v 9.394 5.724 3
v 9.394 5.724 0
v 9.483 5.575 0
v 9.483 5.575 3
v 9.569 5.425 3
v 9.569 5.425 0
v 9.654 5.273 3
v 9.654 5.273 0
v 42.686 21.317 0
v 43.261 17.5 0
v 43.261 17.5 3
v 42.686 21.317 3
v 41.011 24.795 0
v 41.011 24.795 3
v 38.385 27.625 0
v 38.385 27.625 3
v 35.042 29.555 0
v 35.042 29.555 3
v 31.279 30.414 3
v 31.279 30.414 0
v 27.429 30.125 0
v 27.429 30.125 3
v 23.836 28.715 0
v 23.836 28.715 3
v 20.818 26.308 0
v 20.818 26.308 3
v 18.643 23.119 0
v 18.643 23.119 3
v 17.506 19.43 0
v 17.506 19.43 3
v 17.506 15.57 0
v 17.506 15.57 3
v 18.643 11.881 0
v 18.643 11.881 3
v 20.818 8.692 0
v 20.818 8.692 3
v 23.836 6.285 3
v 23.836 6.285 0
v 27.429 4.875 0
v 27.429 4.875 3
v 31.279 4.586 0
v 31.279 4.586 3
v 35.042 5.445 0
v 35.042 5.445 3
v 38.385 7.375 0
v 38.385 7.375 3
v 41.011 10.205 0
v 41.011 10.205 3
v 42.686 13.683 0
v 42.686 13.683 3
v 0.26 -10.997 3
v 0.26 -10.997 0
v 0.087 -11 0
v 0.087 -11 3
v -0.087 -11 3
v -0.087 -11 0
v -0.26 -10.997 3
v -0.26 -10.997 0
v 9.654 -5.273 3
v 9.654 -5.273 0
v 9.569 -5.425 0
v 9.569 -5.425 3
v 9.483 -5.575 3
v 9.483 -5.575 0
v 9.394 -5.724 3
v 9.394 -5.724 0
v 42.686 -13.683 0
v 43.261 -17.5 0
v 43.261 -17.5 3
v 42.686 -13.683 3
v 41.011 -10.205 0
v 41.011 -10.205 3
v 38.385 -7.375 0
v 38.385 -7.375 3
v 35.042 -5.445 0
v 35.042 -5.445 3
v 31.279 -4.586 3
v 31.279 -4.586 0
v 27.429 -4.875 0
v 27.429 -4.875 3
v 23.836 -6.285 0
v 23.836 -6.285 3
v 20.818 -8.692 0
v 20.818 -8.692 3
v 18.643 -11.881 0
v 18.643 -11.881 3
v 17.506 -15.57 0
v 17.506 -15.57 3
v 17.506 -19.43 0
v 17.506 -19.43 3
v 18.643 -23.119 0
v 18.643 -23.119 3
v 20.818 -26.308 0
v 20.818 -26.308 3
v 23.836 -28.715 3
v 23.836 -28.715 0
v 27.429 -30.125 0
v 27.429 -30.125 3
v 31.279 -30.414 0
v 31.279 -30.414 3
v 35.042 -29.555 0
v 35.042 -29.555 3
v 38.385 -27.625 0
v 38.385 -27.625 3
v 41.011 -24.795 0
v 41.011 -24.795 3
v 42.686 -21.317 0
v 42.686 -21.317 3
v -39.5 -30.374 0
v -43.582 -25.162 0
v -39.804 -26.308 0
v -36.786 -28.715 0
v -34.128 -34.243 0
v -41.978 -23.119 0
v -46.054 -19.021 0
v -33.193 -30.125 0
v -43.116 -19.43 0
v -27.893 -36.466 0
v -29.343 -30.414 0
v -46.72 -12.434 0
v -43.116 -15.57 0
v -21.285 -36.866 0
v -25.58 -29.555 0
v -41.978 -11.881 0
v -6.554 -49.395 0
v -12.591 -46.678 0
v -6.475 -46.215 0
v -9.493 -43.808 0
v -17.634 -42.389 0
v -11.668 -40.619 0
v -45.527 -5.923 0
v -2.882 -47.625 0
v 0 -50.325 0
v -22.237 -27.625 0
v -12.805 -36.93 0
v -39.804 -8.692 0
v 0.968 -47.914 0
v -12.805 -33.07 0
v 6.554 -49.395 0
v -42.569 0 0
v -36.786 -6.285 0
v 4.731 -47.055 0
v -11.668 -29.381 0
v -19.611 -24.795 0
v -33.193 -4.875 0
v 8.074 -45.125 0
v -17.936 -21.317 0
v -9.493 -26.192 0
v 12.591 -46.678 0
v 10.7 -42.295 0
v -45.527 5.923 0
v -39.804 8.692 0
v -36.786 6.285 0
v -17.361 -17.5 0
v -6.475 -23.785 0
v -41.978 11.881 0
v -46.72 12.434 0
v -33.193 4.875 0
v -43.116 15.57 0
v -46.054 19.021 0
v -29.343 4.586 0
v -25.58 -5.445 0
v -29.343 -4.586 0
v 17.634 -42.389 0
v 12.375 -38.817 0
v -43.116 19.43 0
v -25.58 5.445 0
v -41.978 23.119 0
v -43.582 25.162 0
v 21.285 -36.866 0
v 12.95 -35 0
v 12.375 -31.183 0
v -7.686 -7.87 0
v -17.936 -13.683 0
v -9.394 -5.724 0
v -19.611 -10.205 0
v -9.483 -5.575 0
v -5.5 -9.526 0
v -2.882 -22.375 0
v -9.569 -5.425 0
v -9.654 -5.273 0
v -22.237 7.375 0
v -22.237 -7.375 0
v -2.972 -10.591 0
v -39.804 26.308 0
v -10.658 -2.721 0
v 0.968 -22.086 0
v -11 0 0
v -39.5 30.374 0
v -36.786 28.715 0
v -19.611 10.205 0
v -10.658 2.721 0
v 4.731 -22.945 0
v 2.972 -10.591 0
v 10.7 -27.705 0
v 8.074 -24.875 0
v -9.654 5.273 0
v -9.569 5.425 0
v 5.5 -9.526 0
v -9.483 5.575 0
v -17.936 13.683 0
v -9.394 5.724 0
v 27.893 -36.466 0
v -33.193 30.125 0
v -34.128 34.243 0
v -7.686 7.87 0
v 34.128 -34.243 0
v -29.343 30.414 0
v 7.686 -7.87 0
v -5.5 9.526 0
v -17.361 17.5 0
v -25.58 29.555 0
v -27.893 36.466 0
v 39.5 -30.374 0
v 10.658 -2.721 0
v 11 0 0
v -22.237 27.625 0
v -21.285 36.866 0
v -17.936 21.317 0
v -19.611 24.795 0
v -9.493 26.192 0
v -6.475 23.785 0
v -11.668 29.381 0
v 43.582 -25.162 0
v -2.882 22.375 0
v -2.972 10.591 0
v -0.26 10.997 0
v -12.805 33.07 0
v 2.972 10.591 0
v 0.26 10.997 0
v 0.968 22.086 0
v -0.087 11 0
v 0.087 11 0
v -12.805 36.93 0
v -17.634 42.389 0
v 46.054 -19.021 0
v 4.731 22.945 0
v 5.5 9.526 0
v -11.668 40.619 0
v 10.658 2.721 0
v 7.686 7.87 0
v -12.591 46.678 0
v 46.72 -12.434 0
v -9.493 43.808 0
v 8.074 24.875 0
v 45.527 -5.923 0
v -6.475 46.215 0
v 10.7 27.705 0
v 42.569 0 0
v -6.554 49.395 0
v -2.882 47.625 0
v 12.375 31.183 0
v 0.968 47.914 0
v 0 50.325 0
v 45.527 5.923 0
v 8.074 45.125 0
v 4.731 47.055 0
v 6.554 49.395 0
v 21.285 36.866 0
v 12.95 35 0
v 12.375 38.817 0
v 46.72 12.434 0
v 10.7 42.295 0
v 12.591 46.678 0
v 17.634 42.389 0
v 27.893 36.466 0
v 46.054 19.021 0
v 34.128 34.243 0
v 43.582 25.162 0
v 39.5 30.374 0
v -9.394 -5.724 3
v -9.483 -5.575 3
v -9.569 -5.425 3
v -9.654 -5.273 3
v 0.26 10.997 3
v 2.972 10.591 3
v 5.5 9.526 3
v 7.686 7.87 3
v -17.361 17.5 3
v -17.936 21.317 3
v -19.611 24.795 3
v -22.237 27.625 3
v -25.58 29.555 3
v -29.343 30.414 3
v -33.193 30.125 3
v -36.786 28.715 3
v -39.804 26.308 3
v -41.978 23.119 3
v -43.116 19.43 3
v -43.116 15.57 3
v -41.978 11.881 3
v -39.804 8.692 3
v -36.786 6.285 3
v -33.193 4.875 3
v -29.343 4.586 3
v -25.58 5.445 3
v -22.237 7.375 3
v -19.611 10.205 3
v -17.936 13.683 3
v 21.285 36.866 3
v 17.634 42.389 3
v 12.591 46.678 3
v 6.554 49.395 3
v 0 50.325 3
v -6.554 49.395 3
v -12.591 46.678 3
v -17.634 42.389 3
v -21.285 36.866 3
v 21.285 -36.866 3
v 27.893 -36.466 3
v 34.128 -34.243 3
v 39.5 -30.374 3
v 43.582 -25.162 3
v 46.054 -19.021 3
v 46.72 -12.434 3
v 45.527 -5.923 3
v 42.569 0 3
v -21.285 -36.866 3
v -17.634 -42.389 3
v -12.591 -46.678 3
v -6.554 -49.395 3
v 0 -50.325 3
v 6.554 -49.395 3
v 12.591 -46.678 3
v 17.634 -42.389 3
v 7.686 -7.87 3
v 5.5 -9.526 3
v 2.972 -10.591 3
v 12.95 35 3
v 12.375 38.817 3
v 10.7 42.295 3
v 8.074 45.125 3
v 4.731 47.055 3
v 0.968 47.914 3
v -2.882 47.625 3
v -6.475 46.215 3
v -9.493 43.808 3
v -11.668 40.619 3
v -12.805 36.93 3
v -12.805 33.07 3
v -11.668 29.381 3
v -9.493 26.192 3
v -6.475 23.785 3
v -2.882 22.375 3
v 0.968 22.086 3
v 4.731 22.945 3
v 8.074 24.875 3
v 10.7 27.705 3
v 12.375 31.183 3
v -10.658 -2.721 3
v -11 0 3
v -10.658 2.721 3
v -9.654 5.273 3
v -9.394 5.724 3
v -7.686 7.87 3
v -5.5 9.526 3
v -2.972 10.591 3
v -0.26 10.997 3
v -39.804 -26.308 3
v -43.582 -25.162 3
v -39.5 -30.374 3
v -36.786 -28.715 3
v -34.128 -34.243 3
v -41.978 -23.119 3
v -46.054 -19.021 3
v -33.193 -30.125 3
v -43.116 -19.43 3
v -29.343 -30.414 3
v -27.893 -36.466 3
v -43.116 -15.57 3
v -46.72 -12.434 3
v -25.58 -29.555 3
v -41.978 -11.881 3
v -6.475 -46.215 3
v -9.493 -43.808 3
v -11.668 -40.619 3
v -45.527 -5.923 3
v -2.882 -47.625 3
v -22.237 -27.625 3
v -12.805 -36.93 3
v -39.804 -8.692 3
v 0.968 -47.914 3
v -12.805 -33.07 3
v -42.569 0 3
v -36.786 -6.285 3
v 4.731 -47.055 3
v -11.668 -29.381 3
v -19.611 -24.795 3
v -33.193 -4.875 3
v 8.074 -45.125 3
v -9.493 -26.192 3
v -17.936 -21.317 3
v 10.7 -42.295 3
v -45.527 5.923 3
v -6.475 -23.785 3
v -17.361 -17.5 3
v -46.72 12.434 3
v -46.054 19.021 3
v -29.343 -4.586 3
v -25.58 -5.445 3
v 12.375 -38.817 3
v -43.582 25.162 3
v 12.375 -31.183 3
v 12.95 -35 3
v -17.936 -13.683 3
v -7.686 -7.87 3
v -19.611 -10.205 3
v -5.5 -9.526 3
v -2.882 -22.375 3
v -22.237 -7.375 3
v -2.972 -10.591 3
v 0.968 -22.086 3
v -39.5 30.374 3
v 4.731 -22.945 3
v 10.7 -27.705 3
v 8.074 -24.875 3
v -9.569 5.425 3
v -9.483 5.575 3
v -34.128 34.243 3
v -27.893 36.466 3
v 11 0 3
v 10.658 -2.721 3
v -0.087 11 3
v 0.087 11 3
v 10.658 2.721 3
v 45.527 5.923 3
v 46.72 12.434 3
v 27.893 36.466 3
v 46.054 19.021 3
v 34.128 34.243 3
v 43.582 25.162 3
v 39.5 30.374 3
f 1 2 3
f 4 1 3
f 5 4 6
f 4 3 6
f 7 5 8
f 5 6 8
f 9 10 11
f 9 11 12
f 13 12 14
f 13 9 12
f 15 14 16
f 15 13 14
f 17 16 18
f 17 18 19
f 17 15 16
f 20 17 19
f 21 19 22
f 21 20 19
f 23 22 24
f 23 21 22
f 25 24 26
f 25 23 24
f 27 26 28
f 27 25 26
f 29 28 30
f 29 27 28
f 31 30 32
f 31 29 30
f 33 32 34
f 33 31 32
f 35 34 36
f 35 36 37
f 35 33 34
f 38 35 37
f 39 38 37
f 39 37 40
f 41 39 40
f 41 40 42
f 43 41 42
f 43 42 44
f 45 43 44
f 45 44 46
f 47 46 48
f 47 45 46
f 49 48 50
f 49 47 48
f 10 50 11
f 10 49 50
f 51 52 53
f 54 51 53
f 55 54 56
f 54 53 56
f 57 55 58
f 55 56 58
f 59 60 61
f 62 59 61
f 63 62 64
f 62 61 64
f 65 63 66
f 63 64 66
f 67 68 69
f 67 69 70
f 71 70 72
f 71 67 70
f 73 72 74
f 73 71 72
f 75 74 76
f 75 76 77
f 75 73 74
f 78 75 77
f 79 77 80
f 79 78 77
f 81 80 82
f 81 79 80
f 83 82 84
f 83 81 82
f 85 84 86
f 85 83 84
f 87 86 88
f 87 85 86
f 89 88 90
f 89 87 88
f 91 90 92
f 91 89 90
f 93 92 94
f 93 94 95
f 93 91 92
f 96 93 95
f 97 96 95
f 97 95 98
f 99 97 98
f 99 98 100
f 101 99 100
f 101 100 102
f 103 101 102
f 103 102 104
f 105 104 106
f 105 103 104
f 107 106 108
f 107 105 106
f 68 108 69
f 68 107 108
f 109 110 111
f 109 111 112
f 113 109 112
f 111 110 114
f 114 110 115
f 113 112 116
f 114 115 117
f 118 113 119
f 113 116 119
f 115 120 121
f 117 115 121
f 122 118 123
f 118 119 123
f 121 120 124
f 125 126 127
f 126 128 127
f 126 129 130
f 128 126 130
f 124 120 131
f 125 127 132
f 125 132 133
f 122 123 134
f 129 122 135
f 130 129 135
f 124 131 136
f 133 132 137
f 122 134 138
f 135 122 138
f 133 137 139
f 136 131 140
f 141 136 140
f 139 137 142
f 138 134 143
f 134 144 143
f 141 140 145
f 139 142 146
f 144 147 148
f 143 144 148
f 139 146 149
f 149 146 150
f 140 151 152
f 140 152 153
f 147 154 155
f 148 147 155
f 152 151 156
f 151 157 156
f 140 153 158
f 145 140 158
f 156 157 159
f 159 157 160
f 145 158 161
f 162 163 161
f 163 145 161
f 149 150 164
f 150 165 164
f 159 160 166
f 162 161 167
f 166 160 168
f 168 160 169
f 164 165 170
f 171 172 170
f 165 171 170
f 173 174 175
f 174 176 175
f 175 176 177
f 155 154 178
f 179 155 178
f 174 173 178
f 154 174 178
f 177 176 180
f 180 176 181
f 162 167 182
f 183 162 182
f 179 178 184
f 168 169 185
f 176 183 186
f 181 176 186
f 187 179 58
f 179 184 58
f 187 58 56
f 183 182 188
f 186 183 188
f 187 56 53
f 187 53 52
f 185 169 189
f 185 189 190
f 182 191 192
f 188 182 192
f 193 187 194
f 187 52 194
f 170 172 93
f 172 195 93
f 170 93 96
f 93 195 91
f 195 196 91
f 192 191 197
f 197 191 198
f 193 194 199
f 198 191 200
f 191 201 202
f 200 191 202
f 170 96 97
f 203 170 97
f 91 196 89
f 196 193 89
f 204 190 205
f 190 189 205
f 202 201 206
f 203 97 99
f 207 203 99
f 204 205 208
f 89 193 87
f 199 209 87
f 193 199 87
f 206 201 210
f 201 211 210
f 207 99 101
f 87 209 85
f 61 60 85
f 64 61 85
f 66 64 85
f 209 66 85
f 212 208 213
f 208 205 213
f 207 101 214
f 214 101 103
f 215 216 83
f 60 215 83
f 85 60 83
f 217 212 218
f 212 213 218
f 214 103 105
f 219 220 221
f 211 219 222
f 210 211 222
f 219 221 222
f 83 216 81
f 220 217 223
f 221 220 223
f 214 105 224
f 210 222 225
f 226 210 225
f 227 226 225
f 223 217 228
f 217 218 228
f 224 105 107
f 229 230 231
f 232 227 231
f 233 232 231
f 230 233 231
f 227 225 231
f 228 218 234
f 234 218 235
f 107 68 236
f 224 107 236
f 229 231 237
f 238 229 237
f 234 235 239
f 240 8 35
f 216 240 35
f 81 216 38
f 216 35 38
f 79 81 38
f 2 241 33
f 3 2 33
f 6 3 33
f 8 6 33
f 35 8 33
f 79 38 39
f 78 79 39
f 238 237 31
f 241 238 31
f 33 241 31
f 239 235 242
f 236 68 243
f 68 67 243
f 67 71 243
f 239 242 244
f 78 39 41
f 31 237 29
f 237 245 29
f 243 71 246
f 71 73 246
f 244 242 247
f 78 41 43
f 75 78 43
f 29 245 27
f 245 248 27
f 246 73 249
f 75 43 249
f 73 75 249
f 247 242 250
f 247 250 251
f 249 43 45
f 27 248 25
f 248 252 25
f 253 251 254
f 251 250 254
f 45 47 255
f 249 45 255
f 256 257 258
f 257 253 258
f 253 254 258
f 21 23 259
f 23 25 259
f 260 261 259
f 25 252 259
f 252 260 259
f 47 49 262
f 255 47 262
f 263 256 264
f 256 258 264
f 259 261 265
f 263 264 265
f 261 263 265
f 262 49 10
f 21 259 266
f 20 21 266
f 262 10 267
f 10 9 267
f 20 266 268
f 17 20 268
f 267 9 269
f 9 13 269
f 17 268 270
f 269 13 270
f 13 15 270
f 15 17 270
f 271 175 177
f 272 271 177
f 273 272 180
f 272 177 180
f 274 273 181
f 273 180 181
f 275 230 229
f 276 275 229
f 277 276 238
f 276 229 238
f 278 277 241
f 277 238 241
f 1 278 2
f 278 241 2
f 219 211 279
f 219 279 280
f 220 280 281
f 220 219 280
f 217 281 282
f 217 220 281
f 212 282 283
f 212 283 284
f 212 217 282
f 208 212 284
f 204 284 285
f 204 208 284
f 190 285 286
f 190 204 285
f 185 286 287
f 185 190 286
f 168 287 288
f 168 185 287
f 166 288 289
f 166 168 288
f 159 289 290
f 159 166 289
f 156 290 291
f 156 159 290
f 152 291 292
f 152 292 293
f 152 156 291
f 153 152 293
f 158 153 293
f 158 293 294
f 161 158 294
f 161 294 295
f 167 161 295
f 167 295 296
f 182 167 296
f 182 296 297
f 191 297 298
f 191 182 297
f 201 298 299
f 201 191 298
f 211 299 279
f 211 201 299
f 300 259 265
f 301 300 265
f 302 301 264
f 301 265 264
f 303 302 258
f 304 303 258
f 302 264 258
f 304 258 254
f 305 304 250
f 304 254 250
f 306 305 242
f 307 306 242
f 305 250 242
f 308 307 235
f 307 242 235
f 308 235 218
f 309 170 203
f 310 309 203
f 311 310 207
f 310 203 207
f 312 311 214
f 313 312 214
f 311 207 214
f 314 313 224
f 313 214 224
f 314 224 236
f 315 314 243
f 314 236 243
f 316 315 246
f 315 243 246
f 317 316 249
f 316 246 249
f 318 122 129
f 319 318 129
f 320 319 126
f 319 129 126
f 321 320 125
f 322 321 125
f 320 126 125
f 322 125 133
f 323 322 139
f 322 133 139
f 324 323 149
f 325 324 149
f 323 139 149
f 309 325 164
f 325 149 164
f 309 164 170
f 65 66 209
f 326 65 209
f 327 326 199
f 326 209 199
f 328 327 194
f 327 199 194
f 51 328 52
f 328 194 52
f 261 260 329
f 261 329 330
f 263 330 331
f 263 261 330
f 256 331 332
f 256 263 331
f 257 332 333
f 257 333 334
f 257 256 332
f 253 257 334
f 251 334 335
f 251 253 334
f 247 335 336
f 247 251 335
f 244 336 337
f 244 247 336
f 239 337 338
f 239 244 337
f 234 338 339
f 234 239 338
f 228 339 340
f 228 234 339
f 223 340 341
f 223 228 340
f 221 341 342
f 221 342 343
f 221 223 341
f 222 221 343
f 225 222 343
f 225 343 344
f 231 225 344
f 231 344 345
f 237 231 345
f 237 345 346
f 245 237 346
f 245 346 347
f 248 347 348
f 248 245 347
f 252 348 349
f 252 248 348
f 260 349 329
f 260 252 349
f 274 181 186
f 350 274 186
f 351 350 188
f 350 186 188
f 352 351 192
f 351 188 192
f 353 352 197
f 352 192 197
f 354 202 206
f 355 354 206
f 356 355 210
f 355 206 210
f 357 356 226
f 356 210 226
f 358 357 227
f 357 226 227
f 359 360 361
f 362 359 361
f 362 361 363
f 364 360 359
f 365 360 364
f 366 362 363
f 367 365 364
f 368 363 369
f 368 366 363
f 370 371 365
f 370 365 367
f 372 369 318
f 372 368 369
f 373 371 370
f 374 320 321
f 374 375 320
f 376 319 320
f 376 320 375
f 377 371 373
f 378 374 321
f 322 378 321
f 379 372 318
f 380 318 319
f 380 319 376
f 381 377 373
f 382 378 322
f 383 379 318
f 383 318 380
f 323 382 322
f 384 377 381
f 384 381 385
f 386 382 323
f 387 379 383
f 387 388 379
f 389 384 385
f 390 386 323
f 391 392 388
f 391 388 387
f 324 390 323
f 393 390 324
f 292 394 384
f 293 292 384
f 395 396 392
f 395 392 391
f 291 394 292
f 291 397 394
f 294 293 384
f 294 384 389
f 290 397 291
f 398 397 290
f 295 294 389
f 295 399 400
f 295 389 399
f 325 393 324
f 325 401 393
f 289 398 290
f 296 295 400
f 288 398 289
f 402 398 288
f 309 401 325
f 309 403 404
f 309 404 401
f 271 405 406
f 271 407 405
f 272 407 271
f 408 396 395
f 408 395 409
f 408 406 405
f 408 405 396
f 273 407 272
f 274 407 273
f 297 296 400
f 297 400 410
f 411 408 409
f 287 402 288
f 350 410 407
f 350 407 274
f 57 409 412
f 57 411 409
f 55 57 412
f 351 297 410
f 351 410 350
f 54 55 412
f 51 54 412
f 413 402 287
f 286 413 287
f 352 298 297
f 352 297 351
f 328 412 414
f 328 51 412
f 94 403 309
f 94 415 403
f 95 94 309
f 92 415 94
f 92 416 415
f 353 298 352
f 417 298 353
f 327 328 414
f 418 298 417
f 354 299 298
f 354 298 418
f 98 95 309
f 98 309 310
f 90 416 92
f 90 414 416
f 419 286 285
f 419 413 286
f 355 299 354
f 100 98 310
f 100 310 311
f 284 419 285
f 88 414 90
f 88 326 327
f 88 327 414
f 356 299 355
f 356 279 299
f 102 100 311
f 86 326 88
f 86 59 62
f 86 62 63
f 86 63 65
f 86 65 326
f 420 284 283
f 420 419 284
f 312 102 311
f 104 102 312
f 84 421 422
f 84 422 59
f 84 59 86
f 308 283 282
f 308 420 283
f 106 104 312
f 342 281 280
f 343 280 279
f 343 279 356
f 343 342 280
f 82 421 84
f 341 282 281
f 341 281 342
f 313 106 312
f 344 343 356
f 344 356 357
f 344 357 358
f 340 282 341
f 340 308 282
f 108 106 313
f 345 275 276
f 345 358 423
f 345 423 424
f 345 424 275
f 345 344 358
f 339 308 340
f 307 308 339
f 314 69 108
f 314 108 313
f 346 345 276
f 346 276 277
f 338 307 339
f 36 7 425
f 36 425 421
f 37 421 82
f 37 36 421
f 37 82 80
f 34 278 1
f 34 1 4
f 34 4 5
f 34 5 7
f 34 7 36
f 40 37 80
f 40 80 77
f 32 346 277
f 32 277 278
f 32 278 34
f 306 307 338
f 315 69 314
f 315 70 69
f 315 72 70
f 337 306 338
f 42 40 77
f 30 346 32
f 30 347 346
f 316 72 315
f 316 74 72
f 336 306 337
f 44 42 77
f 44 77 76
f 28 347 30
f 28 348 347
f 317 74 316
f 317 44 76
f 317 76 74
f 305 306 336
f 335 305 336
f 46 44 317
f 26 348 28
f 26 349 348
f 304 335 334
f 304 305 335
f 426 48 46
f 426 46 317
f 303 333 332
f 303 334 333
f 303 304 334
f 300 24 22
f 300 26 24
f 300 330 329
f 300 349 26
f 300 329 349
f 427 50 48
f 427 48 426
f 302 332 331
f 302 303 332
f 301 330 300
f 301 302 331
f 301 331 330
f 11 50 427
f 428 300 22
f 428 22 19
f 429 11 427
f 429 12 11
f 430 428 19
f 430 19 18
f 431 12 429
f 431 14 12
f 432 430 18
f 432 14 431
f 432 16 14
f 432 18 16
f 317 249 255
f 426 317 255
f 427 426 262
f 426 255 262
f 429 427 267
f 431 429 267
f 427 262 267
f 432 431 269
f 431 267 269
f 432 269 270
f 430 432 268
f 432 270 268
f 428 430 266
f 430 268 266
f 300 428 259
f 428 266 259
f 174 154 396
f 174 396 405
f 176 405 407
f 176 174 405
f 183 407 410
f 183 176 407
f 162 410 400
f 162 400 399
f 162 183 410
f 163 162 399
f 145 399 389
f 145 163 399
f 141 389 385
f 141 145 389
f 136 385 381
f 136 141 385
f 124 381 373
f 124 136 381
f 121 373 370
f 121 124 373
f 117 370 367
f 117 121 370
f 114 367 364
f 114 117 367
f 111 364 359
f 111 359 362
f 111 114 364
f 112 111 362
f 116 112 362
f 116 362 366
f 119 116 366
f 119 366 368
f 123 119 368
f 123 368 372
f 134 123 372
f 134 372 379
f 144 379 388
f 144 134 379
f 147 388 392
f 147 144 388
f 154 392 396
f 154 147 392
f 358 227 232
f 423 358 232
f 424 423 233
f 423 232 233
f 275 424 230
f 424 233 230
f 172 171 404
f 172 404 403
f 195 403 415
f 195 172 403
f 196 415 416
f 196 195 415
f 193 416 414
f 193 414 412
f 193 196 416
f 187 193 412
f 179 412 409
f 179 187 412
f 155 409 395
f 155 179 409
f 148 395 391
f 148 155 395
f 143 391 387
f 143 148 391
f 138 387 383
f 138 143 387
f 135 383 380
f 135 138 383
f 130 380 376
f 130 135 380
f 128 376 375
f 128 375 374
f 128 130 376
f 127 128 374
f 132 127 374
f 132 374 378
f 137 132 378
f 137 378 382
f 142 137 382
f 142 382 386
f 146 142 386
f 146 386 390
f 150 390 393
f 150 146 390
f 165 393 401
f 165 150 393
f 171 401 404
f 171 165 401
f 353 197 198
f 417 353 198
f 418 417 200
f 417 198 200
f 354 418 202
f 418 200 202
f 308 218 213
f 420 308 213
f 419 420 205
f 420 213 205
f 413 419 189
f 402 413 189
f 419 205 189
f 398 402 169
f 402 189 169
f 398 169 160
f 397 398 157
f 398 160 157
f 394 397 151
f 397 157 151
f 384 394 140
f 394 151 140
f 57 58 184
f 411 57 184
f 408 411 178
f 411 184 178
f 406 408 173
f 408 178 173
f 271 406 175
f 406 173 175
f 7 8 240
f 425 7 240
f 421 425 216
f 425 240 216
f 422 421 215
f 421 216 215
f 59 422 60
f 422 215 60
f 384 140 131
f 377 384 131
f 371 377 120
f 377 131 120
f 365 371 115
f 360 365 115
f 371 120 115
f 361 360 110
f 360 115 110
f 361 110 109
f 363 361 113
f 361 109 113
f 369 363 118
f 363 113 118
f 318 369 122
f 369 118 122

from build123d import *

# Parameters (mm, degrees)
F0_R     = 12.95
F1_DEPTH = 3


with BuildPart() as f1:
    # F0 (on Top) → F1 (new body)
    with BuildSketch(Plane.XY):
        with BuildLine():
            ThreePointArc((42.56921, 0), (43.582425, 25.162325), (21.284605, 36.866017))
            ThreePointArc((21.284605, 36.866017), (0, 50.32465), (-21.284605, 36.866017))
            ThreePointArc((-21.284605, 36.866017), (-43.582425, 25.162325), (-42.56921, 0))
            ThreePointArc((-42.56921, 0), (-43.582425, -25.162325), (-21.284605, -36.866017))
            ThreePointArc((-21.284605, -36.866017), (0, -50.32465), (21.284605, -36.866017))
            ThreePointArc((21.284605, -36.866017), (43.582425, -25.162325), (42.56921, 0))
        make_face()
        with Locations((0, -35)):
            Circle(F0_R, mode=Mode.SUBTRACT)
        with Locations((-30.310889, -17.5)):
            Circle(F0_R, mode=Mode.SUBTRACT)
        with Locations((30.310889, -17.5)):
            Circle(F0_R, mode=Mode.SUBTRACT)
        with Locations((-30.310889, 17.5)):
            Circle(F0_R, mode=Mode.SUBTRACT)
        with BuildLine():
            ThreePointArc((9.393643, 5.72359), (9.526279, 5.5), (9.653595, 5.273338))
            ThreePointArc((9.653595, 5.273338), (11, 0), (9.653595, -5.273338))
            ThreePointArc((9.653595, -5.273338), (9.526279, -5.5), (9.393643, -5.72359))
            ThreePointArc((9.393643, -5.72359), (5.5, -9.526279), (0.259953, -10.996928))
            ThreePointArc((0.259953, -10.996928), (0, -11), (-0.259953, -10.996928))
            ThreePointArc((-0.259953, -10.996928), (-5.5, -9.526279), (-9.393643, -5.72359))
            ThreePointArc((-9.393643, -5.72359), (-9.526279, -5.5), (-9.653595, -5.273338))
            ThreePointArc((-9.653595, -5.273338), (-11, 0), (-9.653595, 5.273338))
            ThreePointArc((-9.653595, 5.273338), (-9.526279, 5.5), (-9.393643, 5.72359))
            ThreePointArc((-9.393643, 5.72359), (-5.5, 9.526279), (-0.259953, 10.996928))
            ThreePointArc((-0.259953, 10.996928), (0, 11), (0.259953, 10.996928))
            ThreePointArc((0.259953, 10.996928), (5.5, 9.526279), (9.393643, 5.72359))
        make_face(mode=Mode.SUBTRACT)
        with Locations((0, 35)):
            Circle(F0_R, mode=Mode.SUBTRACT)
        with Locations((30.310889, 17.5)):
            Circle(F0_R, mode=Mode.SUBTRACT)
    extrude(amount=F1_DEPTH)


solid = f1.part
